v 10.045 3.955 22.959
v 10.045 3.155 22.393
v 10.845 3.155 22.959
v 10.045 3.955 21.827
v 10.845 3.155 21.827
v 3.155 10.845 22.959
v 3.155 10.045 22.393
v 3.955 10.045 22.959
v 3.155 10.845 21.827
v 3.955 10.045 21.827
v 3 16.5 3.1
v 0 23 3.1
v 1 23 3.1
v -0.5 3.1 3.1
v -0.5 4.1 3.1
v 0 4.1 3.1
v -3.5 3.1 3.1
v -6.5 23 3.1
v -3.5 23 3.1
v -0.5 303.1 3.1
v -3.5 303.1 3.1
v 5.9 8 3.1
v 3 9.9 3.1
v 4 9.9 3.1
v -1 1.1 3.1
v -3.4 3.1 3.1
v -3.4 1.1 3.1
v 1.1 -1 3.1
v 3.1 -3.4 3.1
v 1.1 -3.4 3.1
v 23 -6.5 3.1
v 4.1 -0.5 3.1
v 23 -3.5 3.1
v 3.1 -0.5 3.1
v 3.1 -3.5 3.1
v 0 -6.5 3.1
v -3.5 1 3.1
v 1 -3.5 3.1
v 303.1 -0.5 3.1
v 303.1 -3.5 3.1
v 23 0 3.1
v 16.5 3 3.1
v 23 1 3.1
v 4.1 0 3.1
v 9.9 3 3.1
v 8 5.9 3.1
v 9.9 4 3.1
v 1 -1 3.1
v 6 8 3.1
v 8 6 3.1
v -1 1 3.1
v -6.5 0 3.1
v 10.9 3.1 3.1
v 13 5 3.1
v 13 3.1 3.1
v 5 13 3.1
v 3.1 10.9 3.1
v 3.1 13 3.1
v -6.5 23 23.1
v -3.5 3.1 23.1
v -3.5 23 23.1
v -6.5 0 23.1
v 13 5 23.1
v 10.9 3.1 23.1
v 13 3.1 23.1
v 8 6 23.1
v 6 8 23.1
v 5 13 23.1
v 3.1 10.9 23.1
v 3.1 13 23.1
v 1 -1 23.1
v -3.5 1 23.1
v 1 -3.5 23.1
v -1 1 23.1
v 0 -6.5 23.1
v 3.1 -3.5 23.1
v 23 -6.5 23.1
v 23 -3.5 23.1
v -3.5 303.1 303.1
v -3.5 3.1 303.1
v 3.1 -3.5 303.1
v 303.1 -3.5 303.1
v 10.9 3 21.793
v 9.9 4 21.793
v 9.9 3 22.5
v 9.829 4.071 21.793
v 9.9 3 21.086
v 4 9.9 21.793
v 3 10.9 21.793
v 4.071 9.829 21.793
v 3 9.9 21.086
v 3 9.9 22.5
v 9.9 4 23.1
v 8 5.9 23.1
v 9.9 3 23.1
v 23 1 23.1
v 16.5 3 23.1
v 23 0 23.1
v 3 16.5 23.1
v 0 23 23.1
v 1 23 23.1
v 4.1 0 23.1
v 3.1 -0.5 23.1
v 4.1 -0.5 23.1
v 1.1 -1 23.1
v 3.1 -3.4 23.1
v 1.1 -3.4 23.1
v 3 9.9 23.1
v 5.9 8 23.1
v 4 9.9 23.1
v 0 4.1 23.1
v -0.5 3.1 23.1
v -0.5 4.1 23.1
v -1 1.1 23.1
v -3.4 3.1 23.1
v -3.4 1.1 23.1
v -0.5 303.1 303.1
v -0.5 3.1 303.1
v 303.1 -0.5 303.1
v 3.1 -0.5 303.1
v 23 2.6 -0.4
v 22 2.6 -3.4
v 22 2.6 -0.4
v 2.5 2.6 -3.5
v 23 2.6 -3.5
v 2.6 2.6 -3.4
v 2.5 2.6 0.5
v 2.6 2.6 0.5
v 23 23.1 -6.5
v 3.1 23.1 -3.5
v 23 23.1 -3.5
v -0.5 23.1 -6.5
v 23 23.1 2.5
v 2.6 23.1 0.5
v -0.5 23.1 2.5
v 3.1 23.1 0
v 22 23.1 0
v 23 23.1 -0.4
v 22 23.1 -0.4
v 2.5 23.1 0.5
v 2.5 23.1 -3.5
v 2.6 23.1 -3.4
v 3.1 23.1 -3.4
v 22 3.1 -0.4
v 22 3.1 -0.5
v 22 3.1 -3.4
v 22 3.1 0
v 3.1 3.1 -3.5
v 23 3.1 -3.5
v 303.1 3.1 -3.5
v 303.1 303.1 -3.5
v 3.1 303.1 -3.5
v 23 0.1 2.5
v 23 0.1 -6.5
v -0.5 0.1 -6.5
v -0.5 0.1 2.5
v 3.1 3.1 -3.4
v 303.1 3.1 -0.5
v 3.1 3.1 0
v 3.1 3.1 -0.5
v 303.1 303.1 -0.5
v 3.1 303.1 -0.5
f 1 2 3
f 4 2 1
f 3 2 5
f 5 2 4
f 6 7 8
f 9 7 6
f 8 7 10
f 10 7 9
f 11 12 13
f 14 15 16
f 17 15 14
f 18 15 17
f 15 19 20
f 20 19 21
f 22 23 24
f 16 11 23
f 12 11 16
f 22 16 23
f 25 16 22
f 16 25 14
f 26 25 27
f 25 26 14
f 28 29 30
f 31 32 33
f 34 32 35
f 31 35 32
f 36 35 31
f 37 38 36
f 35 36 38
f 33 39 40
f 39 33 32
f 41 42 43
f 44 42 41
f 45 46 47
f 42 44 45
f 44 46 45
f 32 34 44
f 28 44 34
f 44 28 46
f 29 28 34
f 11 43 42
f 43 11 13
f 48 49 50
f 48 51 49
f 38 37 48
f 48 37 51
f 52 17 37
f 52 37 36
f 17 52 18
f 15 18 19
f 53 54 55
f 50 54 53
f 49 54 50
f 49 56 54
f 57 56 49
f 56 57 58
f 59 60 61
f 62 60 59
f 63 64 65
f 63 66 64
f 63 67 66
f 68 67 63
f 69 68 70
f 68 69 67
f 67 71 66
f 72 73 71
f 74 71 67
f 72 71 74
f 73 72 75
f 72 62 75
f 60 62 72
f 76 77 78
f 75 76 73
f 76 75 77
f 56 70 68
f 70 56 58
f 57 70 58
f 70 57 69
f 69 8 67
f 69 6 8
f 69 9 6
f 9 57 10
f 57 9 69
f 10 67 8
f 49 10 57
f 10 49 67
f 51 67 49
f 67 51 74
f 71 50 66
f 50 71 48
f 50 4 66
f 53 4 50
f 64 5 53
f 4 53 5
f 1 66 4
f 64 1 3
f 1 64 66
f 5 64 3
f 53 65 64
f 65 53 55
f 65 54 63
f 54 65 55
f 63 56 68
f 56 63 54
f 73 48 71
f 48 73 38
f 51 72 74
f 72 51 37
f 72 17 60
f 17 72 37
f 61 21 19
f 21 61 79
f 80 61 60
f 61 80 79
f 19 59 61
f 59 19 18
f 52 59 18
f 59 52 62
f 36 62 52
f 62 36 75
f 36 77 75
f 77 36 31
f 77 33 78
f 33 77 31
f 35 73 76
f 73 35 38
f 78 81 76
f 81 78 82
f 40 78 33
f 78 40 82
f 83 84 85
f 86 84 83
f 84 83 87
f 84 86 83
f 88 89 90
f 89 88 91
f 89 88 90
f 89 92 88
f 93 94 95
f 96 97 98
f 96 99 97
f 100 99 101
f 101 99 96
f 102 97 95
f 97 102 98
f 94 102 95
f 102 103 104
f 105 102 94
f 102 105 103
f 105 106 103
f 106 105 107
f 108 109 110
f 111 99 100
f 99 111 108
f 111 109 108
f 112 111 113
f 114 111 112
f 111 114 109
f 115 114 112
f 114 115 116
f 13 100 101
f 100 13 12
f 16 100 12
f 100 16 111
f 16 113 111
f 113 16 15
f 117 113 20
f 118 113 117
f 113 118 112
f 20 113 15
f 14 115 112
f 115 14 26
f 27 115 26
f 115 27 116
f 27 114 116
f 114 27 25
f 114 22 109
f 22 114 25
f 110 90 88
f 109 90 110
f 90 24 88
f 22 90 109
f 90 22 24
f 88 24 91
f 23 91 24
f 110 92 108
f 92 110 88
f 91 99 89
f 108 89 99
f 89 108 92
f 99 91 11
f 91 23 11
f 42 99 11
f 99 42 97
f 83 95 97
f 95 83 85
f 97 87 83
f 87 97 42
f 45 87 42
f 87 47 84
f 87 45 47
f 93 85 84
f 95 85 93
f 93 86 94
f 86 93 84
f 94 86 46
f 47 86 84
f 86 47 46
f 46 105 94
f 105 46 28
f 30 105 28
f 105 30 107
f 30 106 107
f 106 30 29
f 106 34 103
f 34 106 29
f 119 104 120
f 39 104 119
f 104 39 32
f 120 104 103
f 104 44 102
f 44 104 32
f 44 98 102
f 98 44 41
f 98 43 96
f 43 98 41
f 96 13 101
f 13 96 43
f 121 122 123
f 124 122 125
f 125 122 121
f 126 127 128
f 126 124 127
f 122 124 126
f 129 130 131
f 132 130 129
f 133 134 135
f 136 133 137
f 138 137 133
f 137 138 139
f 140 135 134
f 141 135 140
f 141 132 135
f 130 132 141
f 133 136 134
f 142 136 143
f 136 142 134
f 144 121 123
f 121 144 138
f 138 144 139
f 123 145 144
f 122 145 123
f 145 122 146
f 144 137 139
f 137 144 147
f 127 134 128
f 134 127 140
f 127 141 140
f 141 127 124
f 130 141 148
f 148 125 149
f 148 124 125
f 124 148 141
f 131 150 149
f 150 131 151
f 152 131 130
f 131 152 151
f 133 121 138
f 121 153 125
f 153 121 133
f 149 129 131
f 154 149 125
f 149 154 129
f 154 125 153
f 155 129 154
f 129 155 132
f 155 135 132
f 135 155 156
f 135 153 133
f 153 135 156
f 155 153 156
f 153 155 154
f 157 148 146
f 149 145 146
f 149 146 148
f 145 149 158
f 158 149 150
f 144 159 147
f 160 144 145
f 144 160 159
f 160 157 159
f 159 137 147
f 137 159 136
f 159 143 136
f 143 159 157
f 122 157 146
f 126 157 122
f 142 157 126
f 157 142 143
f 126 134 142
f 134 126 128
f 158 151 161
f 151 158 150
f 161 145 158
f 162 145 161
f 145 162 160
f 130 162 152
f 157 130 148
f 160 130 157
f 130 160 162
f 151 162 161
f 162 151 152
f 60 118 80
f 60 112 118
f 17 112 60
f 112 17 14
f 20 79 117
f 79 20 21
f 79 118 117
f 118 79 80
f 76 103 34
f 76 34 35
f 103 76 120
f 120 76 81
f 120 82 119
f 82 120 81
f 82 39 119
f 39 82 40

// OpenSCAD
doitem = "";

s2 = 1.5;  // Very round to get nice even sizes

acryl_thick = 3;  // acrylic wall thickness
tape_thick = 0.5;

conn_thick = 3;    // Connector thickness
conn_width = 20;  // Connector width
conn_depth = 23;  // Connector depth

if (doitem == "corner_outside") { edgeconnector_outside_corner(); }
if (doitem == "corner_inside")  { edgeconnector_inside_corner(); }
if (doitem == "edge_inside")    { edgeconnector_inside(); }
if (doitem == "corner_hinge")   { edgeconnector_outside_hinge(); }


if (doitem == "") {
    color("#8a5") edgeconnector_outside_hinge();
    color("#58a") edgeconnector_inside();

    color("#8a5") rotate([0,-90,-90]) hingeconnector_outside();
    color("#58a") rotate([0,-90,-90]) hingeconnector_inside();

    color("#99a4") acryl_plates();
}

module hingeconnector_outside(at = acryl_thick, ct = conn_thick, cw = conn_width,
        cd = conn_depth, tt = tape_thick, nub=1, tol=0.1)
{
    cof = ct/s2+1+tol;
    xi = cof-0.5-tol;
    xo = xi-ct;
    yi = -0.5;
    yo = yi+0.5+tt+at;
    ict = ct-1;
    translate([0,0,cof-0.5]) rotate([0,0,90]) linear_extrude(height=cw+0.5, convexity=5) {
        polygon([
            [xi,yi], [xi,yo], [cd,yo], [cd,yo+ct],
            [xo,yo+ct], [xo, yi-ict], [cd, yi-ict],
            [cd, tt-tol], [cd-1, tt-tol], [cd-1, yi]
        ]);
    }
    translate([0,0,cof-ct]) rotate([0,0,90]) linear_extrude(height=ct-0.5, convexity=5) {
        polygon([
            [xo,yo+ct], [cd,yo+ct], [cd,yi-ict], [xo,yi-ict]
        ]);
    }
}

module hingeconnector_inside(at = acryl_thick, ct = conn_thick, cw = conn_width,
        cd = conn_depth, tt = tape_thick, nub=1, tol=0.1)
{
    cof = ct/s2+1+tol;
    xi = cof-0.5;
    xo = xi-ct;
    yi = -0.5;
    yo = tt+at-tol;
    ict = ct-1;
    translate([0,0,cof]) rotate([0,0,90]) linear_extrude(height=cw, convexity=5) {
        polygon([
            [xi,yi], [xi, yo], [xi+0.5, yo], [xi+0.5,0], [cd-1,0], [cd-1,yi]
        ]);
    }
    translate([0,0,cof-0.5]) rotate([0,0,90]) linear_extrude(height=0.5, convexity=5) {
        polygon([
            [xi,yi], [xi, yo], [cd-1,yo], [cd-1,yi]
        ]);
    }
}

module edgeconnector_inside(at = acryl_thick, ct = conn_thick, cw = conn_width,
        cd = conn_depth, tt = tape_thick, nub=1, tol=0.1)
{
    cof = ct/s2+1+tol;
    translate([0,0,cof]) rotate([0,0,90]) linear_extrude(height=cw, convexity=5) {
        polygon(mirxy(edgecon_in_poly(cd, ct, at, tt)));
    }
    inside_nubs(ct, cw);
}

module edgeconnector_inside_corner(at = acryl_thick, ct = conn_thick, cw = conn_width,
        cd = conn_depth, tt = tape_thick, nub=1, tol=0.1)
{
    cof = ct/s2+1+tol;
    translate([0,0,cof]) rotate([0,0,90]) linear_extrude(height=cw, convexity=5) {
        polygon(mirxy(edgecon_in_poly(cd, ct, at, tt)));
    }
    translate([0,0,-tt]) rotate([0,0,90]) linear_extrude(height=cof+tt, convexity=5) {
        polygon(mirxy(edgecon_in_bot(cd, ct, at, tt)));
    }
    inside_nubs(ct, cw);
}

module inside_nubs(ct, cw, nub=1, tol=0.1)
{
    cof = ct/s2+1+tol;
    cx = ct/s2+ct*3-tol-nub;
    cy = ct+nub;
    translate([cx, cy, cw+cof-nub/sqrt(2)-nub/2-0.1]) rotate([135,0,-45])
        translate([-0.1,0,0]) cube([nub*sqrt(2)+0.2,nub,nub]);
    translate([cy, cx, cw+cof-nub/sqrt(2)-nub/2-0.1]) rotate([-45,0,135])
        translate([-0.1,0,0]) cube([nub*sqrt(2)+0.2,nub,nub]);
}

module edgeconnector_outside(at = acryl_thick, ct = conn_thick, cw = conn_width,
        cd = conn_depth, tt = tape_thick, nub=1, tol=0.1)
{
    cof = ct/s2+1+tol;

    translate([0,0,cof]) rotate([0,0,90]) linear_extrude(height=cw, convexity=5) {
        polygon(mirxy(edgecon_out_innie(cd, ct, at, tt)));
    }
    translate([0,0,cof]) rotate([0,0,90]) linear_extrude(height=cw, convexity=5) {
        polygon(mirxy(edgecon_out_poly(cd, ct, at, tt)));
    }
    outside_nubs(ct, cw);
}

module edgeconnector_outside_hinge(at = acryl_thick, ct = conn_thick, cw = conn_width,
        cd = conn_depth, tt = tape_thick, nub=1, tol=0.1)
{
    cof = ct/s2+1+tol;

    translate([0,0,cof]) rotate([0,0,90]) linear_extrude(height=cw, convexity=5) {
        polygon(mirxy(edgecon_out_innie(cd, ct, at, tt)));
    }
    translate([0,0,cof]) rotate([0,0,90]) linear_extrude(height=cw, convexity=5) {
        polygon(mirxy(edgecon_out_poly(cd, ct, at, tt)));
    }
    *translate([0,0,-tt]) rotate([0,0,90]) linear_extrude(height=tt+cof, convexity=5) {
        polygon(mirxy(edgecon_out_bot(cd, ct, at, tt)));
    }
    outside_nubs(ct, cw);
}

module edgeconnector_outside_corner(at = acryl_thick, ct = conn_thick, cw = conn_width,
        cd = conn_depth, tt = tape_thick, tol=0.1)
{
    cof = ct/s2+1+tol;

    difference() {
        translate([0,0,-tt]) rotate([0,0,90]) linear_extrude(height=cw+cof+tt, convexity=5) {
            polygon(mirxy(edgecon_out_innie(cd, ct, at, tt)));
        }

        c1 = ct/s2*sqrt(2);
        c2 = (2*ct/s2-tol)*sqrt(2);
        c3 = (3*ct/s2-tol)*sqrt(2)+0.01;

        intersection() {
            translate([cof,cof,-tt]) rotate([90,0,45]) translate([0,0,-c1/2-0.01])
                linear_extrude(height=c1+0.02) polygon([
                    [-0.01,-0.01], [c3,-0.01], [c3,c3]
                ]);
            translate([cof,cof,-tt-0.01]) cube([c3,c3,c3+0.02]);
        }
        translate([cof+c3/sqrt(2),cof+c3/sqrt(2),-tt]) rotate([90,0,-45])
            linear_extrude(height=c1+0.1) {
                polygon([
                    [c1/2,-0.01], [c1/2,c3], [c1/2+c2+0.1,c3+c2+0.1], [c1/2+c2+0.1,-0.01]
                ]);
                polygon([
                    [-c1/2,-0.01], [-c1/2,c3], [-(c1/2+c2+0.1),c3+c2+0.1], [-(c1/2+c2+0.1),-0.01]
                ]);
            }
    }
    difference() {
        union() {
            translate([0,0,-tt]) rotate([0,0,90]) linear_extrude(height=cw+cof+tt, convexity=5) {
                polygon(mirxy(edgecon_out_poly(cd, ct, at, tt)));
            }
            translate([0,0,-at-tt]) rotate([0,0,90]) linear_extrude(height=at, convexity=5) {
                polygon(mirxy(edgecon_out_mid(cd, ct, at, tt)));
            }
            translate([0,0,-at-tt-ct]) rotate([0,0,90]) linear_extrude(height=ct, convexity=5) {
                polygon(mirxy(edgecon_out_bot(cd, ct, at, tt)));
            }
        }
        cutsz = (at+tt+ct)*sqrt(2);
        cutln = at+tt+ct+cw+ct;
        translate([cutln/2-at-tt-ct,-at-tt-ct,-at-tt-ct]) rotate([45,0,0]) cube([cutln+0.01,cutsz,cutsz], true);
        translate([-at-tt-ct,cutln/2-at-tt-ct,-at-tt-ct]) rotate([0,45,0]) cube([cutsz,cutln+0.01,cutsz], true);
    }
    outside_nubs(ct, cw);
}

module outside_nubs(ct, cw, nub=1, tol=0.1)
{
    cof = ct/s2+1+tol;
    cx = ct/s2+ct*3-tol/2-nub;
    cy = ct+nub+tol/2;
    ns = nub-0.2;
    translate([cx, cy, cw+cof-nub/sqrt(2)]) rotate([90,0,-45])
        translate([nub-0.3,0,0]) rotate([0,0,45]) cylinder(ns/sqrt(2), ns, 0, $fn=4);
    translate([cy, cx, cw+cof-nub/sqrt(2)]) rotate([90,0,-45])
        translate([-nub+0.3,0,0]) rotate([0,0,45]) cylinder(ns/sqrt(2), ns, 0, $fn=4);
}

function edgecon_in_poly(cd, ct, at, tt, nub=1, tol=0.1) = (
    let (yi = 0
        ,ym = at
        ,yo = ym+ct
        ,xi = ct/s2
        ,xo = cd
        )
    [ [xo-2, yi-ct], [xo, yi-ct+2], [xo, yi], [xi+tol+2, yi], [xi+tol+2, yi+tt], [xi+tol+1, yi+tt]
    , [xi+tol+1, yi+at+tt-tol], [xi+tol-1, yi+at+tt-tol], [xi+tol-1, yi+1]
    , [xi+ct*2, yi-ct*2+tol], [xi+ct*3-tol-nub, yi-ct-nub]
    , [xi+ct*3-tol-nub, yi-ct], [xo-ct*s2-2, yi-ct] ]
);

function edgecon_in_bot(cd, ct, at, tt, nub=1, tol=0.1) = (
    let (yi = 0
        ,ym = at
        ,yo = ym+ct
        ,xi = ct/s2
        ,xo = cd
        )
    [ [xo-2, yi-ct], [xo, yi-ct+2], [xo, ym+tt-tol]
    , [xi+tol-1, ym+tt-tol], [xi+tol-1, yi+1]
    , [xi+ct*2, yi-ct*2+tol], [xi+ct*3-tol-nub, yi-ct-nub], [xi+ct*3-tol-nub, yi-ct], [xo-ct*s2-2, yi-ct] ]
);

function edgecon_out_poly(cd, ct, at, tt, tol=0.1) = (
    let (yi = 0
        ,ym = at+tt
        ,yo = ym+ct
        ,xi = ct/s2
        ,xo = cd
        )
    [ [xi-1, yi+1], [xi-1, ym], [xo, ym], [xo, yo], [0, yo] ]
);

function edgecon_out_innie(cd, ct, at, tt, tol=0.1) = (
    let (yi = 0
        ,ym = at+tt
        ,yo = ym+ct
        ,xi = ct/s2
        ,xo = cd
        )
    [ [xi+ct*3+ct/s2, yi-ct-ct/s2], [xi+ct*3+ct/s2, yi-ct-tol]
    , [xi+ct*3-tol, yi-ct-tol], [xi+ct*2, yi-ct*2], [xi-2, yi+2] ]
);

function edgecon_out_mid(cd, ct, at, tt, tol=0.1) = (
    let (yi = 0
        ,ym = at
        ,yo = ym+ct
        ,xi = ct/s2
        ,xo = cd
        )
    [[0,yo+tt],[xo,yo+tt],[xo,yi-xi-1-tol],[-(yi-xi-1-tol),yi-xi-1-tol]]
);

function edgecon_out_bot(cd, ct, at, tt, tol=0.1) = (
    let (yi = 0
        ,ym = at
        ,yo = ym+ct
        ,xi = ct/s2
        ,xo = cd
        )
    [[0,yo+tt],[xo,yo+tt],[xo,yi-xi-1-tol]]
);

function mirxy(ar) = concat(ar, [for (i=[len(ar)-1:-1:0]) [-ar[i].y, -ar[i].x]]);

module acryl_plates(aw = 300, ah = 300, at = acryl_thick, tt = tape_thick,
        ct = conn_thick, cw = conn_width, tol=0.1)
{
    cof = ct/s2+1+tol;
    echo(cof);
    zof = at+tt;
    *translate([-tt,-cof,0]) rotate([0,0,180]) cube([at, ah, aw]);
    *mirror([1,1,0]) rotate([0,0,180]) translate([tt,ct/s2+1+tol,0]) cube([at, ah, aw]);

    translate([cof,cof,-zof]) cube([aw, ah, at]);
    mirror([1,0,-1]) translate([cof,cof,-zof]) cube([aw, ah, at]);
    mirror([0,1,-1]) translate([cof,cof,-zof]) cube([aw, ah, at]);
}
